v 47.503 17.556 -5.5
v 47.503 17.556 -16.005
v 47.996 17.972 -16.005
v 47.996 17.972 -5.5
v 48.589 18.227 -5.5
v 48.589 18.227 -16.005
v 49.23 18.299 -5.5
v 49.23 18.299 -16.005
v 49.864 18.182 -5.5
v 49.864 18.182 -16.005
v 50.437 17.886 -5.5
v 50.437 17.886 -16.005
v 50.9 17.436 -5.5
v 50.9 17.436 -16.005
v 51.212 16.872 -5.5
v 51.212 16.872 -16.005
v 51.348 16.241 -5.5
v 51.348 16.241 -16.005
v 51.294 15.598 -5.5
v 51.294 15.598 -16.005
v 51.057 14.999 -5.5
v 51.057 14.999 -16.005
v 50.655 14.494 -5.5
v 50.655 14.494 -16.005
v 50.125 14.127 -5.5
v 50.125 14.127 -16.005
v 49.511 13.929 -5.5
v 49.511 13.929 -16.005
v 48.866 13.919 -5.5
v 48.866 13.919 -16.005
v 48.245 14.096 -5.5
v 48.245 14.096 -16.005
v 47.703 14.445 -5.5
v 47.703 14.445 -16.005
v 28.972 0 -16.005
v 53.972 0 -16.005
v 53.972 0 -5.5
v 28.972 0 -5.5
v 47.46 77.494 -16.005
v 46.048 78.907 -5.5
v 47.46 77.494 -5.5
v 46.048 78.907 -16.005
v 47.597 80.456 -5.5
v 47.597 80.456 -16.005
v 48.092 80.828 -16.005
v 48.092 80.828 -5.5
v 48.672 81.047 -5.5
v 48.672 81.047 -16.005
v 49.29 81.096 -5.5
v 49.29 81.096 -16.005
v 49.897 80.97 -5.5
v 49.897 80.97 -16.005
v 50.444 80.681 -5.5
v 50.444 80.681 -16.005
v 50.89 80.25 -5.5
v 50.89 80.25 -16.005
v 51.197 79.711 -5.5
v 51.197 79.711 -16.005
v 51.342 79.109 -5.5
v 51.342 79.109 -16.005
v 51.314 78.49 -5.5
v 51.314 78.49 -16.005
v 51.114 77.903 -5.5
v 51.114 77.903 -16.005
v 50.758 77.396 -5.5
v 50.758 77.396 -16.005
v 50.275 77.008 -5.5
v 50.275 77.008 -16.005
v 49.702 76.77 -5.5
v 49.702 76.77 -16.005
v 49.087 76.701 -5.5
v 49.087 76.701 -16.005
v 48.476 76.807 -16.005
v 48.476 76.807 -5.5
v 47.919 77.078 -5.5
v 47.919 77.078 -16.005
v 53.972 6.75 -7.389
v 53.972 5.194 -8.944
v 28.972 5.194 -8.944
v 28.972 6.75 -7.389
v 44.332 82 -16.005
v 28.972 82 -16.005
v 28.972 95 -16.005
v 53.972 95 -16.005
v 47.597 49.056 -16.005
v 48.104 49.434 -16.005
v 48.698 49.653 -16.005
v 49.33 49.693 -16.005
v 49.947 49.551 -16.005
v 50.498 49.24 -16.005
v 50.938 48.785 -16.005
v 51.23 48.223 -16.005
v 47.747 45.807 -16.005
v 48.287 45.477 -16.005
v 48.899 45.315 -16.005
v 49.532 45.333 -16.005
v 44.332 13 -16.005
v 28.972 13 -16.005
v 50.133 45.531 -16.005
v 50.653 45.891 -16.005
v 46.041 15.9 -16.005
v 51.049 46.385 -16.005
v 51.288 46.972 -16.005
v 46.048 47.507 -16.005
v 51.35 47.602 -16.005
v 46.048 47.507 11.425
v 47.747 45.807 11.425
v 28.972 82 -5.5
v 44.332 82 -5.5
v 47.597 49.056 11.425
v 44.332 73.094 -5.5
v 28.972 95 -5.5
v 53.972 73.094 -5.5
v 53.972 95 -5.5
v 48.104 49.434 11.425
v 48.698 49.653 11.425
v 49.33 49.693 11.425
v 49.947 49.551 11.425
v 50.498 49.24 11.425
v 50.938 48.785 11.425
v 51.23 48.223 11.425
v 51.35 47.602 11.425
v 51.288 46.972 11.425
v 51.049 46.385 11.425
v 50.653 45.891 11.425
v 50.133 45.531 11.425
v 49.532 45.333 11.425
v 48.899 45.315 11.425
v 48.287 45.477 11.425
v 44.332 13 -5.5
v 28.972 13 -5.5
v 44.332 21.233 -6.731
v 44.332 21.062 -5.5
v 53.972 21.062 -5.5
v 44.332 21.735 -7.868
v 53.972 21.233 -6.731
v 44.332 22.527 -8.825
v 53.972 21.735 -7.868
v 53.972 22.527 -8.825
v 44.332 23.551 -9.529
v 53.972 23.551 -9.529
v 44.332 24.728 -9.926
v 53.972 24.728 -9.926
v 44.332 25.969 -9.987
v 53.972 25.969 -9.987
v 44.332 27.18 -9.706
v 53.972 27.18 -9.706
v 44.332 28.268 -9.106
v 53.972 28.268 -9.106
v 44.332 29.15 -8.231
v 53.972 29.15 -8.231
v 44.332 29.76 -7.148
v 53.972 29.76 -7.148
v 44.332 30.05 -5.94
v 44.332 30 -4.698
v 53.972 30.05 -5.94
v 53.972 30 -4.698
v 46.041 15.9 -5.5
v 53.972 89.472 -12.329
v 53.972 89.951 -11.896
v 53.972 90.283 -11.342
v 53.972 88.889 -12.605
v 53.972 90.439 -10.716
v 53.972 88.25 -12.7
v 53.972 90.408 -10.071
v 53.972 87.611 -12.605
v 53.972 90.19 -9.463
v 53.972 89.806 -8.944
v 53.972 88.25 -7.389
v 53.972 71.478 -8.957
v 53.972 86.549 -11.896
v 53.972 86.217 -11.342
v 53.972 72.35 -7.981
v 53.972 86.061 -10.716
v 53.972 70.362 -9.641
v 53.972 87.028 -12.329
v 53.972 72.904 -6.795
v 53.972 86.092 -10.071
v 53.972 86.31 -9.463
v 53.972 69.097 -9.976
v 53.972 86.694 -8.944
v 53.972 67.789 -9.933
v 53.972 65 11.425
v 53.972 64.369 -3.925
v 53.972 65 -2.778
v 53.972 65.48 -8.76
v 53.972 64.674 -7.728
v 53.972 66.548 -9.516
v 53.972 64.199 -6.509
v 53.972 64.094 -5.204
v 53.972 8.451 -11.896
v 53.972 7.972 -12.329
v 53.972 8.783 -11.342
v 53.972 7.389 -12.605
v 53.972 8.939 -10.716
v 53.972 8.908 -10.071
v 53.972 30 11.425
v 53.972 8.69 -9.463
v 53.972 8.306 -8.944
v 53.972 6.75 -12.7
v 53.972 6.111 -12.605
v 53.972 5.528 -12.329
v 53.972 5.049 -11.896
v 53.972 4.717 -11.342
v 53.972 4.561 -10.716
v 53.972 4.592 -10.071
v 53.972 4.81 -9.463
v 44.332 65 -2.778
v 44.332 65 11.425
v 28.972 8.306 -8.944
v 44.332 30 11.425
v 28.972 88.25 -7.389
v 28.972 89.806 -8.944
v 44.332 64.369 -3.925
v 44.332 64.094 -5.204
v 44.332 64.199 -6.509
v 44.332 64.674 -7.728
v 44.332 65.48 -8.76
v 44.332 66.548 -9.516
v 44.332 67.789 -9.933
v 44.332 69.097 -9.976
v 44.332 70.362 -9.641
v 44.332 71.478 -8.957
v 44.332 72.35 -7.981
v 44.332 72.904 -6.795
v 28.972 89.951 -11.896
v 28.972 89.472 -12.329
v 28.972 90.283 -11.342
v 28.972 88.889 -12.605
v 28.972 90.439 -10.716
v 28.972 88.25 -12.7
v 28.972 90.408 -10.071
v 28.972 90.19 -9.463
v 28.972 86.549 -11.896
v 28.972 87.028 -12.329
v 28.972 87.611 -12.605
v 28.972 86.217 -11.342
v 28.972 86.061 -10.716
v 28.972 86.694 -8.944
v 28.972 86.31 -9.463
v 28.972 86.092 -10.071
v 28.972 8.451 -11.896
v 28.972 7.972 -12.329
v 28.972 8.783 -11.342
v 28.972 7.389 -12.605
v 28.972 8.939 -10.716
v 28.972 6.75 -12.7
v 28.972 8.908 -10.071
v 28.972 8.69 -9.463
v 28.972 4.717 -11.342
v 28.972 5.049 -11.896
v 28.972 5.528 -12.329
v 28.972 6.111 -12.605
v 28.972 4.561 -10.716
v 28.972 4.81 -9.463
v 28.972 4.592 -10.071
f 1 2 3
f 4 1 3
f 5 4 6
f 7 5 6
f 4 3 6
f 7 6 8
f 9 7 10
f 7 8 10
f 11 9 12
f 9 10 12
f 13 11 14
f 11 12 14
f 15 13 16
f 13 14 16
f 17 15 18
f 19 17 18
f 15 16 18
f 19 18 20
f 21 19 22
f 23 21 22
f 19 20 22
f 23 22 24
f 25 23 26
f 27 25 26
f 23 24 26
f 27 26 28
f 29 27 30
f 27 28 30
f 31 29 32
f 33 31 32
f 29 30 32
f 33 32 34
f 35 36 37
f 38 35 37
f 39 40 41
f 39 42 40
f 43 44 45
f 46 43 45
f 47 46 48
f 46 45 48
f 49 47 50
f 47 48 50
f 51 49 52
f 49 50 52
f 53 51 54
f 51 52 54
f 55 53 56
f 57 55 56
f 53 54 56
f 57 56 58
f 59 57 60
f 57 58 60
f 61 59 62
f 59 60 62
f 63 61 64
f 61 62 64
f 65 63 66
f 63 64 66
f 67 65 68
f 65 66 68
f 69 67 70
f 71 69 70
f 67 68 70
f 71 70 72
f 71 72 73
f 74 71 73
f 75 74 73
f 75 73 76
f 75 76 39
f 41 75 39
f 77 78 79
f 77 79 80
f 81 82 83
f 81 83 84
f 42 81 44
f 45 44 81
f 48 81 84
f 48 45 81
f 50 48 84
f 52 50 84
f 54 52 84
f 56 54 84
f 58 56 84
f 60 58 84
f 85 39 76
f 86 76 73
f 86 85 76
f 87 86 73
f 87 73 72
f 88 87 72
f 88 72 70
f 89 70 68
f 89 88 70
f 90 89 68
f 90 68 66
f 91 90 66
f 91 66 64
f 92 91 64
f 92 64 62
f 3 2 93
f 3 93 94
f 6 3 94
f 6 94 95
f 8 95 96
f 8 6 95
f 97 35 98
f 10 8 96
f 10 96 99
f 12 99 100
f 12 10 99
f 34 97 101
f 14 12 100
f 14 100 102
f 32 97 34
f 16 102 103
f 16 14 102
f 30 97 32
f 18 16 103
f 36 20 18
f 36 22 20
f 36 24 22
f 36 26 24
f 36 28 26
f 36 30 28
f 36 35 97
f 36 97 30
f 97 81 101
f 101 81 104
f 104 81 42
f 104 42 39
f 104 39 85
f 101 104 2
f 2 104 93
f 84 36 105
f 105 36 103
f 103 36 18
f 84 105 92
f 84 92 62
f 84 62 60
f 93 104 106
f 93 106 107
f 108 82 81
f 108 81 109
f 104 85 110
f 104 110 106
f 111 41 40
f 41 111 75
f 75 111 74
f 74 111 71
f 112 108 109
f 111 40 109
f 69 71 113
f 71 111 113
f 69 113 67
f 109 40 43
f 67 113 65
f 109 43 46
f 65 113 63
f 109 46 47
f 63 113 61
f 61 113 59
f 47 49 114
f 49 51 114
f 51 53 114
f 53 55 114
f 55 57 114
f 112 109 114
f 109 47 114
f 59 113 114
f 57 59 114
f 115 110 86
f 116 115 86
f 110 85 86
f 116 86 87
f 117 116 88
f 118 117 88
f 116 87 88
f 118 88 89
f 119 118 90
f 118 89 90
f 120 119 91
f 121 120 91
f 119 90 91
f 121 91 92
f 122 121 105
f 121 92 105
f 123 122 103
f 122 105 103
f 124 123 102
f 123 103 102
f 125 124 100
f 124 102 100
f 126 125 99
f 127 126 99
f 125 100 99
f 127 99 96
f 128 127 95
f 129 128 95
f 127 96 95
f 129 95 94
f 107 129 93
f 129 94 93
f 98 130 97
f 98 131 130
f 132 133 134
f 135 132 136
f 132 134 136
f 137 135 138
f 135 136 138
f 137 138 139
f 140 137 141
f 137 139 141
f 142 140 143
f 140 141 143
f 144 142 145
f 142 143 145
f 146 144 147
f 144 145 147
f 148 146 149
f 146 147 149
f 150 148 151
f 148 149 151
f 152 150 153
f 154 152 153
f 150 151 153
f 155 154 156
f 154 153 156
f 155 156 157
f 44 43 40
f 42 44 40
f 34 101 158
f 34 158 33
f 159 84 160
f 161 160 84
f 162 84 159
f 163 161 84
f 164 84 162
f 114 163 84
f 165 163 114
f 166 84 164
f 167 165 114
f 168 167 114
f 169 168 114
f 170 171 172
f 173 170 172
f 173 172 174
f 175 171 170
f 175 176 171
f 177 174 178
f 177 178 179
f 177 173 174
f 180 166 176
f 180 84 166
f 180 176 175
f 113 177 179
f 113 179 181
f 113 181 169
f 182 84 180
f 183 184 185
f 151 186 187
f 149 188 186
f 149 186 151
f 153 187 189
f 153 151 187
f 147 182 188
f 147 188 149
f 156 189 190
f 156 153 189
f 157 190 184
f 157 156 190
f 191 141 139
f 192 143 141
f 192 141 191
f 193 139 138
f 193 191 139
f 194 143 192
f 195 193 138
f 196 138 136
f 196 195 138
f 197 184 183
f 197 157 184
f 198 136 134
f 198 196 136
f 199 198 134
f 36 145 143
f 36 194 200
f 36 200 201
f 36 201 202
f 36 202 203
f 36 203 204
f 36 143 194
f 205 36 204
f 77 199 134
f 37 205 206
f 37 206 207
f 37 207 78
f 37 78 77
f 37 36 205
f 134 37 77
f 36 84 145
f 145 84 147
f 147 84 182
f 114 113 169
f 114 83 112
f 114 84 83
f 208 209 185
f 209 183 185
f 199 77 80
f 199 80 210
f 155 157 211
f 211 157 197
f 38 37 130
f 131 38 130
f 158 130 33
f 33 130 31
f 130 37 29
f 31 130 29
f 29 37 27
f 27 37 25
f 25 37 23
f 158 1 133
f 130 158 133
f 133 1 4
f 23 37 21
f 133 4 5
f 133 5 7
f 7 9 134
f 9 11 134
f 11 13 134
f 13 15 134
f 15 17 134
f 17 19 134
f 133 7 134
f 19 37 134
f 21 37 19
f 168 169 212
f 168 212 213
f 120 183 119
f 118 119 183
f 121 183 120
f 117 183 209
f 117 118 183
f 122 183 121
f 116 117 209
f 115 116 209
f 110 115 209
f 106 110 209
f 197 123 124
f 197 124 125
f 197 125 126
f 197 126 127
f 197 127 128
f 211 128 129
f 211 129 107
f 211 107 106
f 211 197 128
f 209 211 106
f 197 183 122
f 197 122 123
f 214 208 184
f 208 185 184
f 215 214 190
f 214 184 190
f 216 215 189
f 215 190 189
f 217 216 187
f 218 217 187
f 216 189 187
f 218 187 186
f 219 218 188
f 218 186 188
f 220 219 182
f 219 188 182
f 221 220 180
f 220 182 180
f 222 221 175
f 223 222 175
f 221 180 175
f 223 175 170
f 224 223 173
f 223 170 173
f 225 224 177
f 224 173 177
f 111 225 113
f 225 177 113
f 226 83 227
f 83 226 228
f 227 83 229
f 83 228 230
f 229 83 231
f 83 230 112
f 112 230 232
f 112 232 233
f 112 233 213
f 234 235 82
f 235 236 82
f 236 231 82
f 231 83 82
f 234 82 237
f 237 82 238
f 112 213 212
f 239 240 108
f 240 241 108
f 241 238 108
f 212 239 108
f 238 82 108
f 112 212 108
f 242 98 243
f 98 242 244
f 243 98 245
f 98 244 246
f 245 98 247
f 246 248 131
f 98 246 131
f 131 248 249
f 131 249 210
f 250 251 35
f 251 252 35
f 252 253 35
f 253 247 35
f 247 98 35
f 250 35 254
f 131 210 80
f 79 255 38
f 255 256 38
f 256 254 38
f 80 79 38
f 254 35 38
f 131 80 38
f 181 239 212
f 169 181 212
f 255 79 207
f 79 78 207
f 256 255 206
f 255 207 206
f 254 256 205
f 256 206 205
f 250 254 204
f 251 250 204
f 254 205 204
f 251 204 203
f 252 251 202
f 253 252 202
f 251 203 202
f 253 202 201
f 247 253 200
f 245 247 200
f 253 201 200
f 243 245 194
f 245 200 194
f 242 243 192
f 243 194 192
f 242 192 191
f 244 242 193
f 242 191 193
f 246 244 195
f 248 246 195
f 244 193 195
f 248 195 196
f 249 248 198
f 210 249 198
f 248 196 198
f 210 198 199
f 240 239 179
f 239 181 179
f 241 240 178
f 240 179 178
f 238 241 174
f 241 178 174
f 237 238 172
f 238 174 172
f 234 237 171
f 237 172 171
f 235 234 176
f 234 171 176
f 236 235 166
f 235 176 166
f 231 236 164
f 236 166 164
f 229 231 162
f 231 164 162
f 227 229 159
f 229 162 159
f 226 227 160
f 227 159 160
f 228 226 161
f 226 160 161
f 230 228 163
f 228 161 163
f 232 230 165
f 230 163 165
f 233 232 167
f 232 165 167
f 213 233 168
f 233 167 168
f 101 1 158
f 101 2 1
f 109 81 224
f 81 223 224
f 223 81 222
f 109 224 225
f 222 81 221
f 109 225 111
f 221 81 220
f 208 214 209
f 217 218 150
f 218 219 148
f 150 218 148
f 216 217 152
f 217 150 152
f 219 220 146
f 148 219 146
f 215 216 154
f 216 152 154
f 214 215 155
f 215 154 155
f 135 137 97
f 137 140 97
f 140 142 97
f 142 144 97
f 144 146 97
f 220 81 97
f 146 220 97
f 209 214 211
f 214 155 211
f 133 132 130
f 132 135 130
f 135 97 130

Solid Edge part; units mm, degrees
sketch "Sketch1" plane through (0, 0, 0) normal (0, -1, 0) x (1, 0, 0)
  line L0 (28.9723, -16.0049) -> (28.9723, -4)
  line L1 (30.8556, 0.4736) -> (28.9723, -4)
  line L2 (41.8072, 11.4251) -> (30.8556, 0.4736)
  line L3 (53.9723, 11.4251) -> (41.8072, 11.4251)
  line L4 (53.9723, -16.0049) -> (53.9723, 11.4251)
  line L5 (28.9723, -16.0049) -> (53.9723, -16.0049)
  dimension "D1" = 8.9878
  dimension "D2" = 5.2
  dimension "D3" = 27.43
extrude "Protrusion1" add sketch "Sketch1" against normal blind 95
sketch "Sketch2" plane through (53.9723, 47.5, 1.7845) normal (1, 0, 0) x (0, 1, 0)
  line L0 (39.1944, -10.7289) -> (40.75, -9.1733)
  line L1 (40.75, -9.1733) -> (42.3056, -10.7289)
  arc A0 (42.3056, -10.7289) -> (39.1944, -10.7289) centre (40.75, -12.2845) cw
  line L2 (-42.3056, -10.7289) -> (-40.75, -9.1733)
  line L3 (-40.75, -9.1733) -> (-39.1944, -10.7289)
  arc A1 (-39.1944, -10.7289) -> (-42.3056, -10.7289) centre (-40.75, -12.2845) cw
  dimension "D1" = 6.75
  dimension "D2" = 6.5
  dimension "D3" = 47.5
extrude "ExtrudedCutout_1" cut sketch "Sketch2" against normal blind 51.2416
sketch "Sketch3" plane through (41.4723, 0, -2.7874) normal (0, -1, 0) x (1, 0, 0)
  line L0 (2.8601, -0.8674) -> (2.8601, 15.2148)
  line L1 (2.8601, 15.2148) -> (-13.7847, 15.2148)
  line L2 (-13.7847, 15.2148) -> (-13.7847, -0.8674)
  line L3 (-13.7847, -0.8674) -> (2.8601, -0.8674)
extrude "ExtrudedCutout_12" cut sketch "Sketch3" against normal blind 115.4646
sketch "Sketch4" plane through (41.4723, 47.5, -17) normal (0, 0, -1) x (-1, 0, 0)
  line L0 (-6.1244, 32.9556) -> (-4.5754, 31.4066)
  line L1 (-4.5754, 31.4066) -> (-5.9875, 29.9945)
  arc A0 (-6.1244, 32.9556) -> (-5.9875, 29.9945) centre (-7.68, 31.4) ccw
  line L2 (-6.1244, 1.5556) -> (-4.5754, 0.0066)
  line L3 (-4.5754, 0.0066) -> (-6.2745, -1.6925)
  arc A1 (-6.1244, 1.5556) -> (-6.2745, -1.6925) centre (-7.68, 0) ccw
  line L4 (-6.0308, -29.944) -> (-4.5687, -31.6)
  line L5 (-4.5687, -31.6) -> (-6.2308, -33.0552)
  arc A2 (-6.0308, -29.944) -> (-6.2308, -33.0552) centre (-7.68, -31.4) ccw
extrude "ExtrudedCutout_14" cut sketch "Sketch4" against normal blind 69.6341
sketch "Sketch5" plane through (28.9723, 47.5, -10.5) normal (-1, 0, 0) x (0, -1, 0)
  line L0 (-34.5, -6.5) -> (-34.5, 6.8451)
  line L1 (-34.5, 6.8451) -> (34.5, 6.8451)
  line L2 (34.5, 6.8451) -> (34.5, -6.5)
  line L3 (34.5, -6.5) -> (-34.5, -6.5)
  dimension "D1" = 13
  dimension "D2" = 13
extrude "Cutout1" cut sketch "Sketch5" against normal up to surface (15.3601 mm away)
sketch "Sketch6" plane through (53.9723, 47.5, -2.7874) normal (1, 0, 0) x (0, 1, 0)
  line L0 (-17.5, -2.7126) -> (-17.5, 14.2126)
  line L1 (-17.5, 14.2126) -> (-47.5, 14.2126)
  line L2 (-47.5, 14.2126) -> (-47.5, -2.7126)
  line L3 (-47.5, -2.7126) -> (-37.5, -2.7126)
  line L4 (-37.5, -2.7126) -> (-17.5, -2.7126)
  line L5 (17.5, 14.2126) -> (17.5, -2.7126)
  line L6 (17.5, -2.7126) -> (37.5, -2.7126)
  line L7 (37.5, -2.7126) -> (47.5, -2.7126)
  line L8 (47.5, 14.2126) -> (47.5, -2.7126)
  line L9 (47.5, 14.2126) -> (17.5, 14.2126)
extrude "ExtrudedCutout_18" cut sketch "Sketch6" against normal blind 89.0785
sketch "Sketch7" plane through (53.9723, 47.5, -2.2899) normal (1, 0, 0) x (0, 1, 0)
  circle A0 centre (21.0894, -3.2101) radius 4.5049
  circle A1 centre (-21.933, -3.2101) radius 4.5049
  dimension "D1" = 6
  dimension "D2" = 6
extrude "Cutout2" cut sketch "Sketch7" against normal up to vertex (21.3514 mm away)
properties material "ABS Plastic, high impact"
